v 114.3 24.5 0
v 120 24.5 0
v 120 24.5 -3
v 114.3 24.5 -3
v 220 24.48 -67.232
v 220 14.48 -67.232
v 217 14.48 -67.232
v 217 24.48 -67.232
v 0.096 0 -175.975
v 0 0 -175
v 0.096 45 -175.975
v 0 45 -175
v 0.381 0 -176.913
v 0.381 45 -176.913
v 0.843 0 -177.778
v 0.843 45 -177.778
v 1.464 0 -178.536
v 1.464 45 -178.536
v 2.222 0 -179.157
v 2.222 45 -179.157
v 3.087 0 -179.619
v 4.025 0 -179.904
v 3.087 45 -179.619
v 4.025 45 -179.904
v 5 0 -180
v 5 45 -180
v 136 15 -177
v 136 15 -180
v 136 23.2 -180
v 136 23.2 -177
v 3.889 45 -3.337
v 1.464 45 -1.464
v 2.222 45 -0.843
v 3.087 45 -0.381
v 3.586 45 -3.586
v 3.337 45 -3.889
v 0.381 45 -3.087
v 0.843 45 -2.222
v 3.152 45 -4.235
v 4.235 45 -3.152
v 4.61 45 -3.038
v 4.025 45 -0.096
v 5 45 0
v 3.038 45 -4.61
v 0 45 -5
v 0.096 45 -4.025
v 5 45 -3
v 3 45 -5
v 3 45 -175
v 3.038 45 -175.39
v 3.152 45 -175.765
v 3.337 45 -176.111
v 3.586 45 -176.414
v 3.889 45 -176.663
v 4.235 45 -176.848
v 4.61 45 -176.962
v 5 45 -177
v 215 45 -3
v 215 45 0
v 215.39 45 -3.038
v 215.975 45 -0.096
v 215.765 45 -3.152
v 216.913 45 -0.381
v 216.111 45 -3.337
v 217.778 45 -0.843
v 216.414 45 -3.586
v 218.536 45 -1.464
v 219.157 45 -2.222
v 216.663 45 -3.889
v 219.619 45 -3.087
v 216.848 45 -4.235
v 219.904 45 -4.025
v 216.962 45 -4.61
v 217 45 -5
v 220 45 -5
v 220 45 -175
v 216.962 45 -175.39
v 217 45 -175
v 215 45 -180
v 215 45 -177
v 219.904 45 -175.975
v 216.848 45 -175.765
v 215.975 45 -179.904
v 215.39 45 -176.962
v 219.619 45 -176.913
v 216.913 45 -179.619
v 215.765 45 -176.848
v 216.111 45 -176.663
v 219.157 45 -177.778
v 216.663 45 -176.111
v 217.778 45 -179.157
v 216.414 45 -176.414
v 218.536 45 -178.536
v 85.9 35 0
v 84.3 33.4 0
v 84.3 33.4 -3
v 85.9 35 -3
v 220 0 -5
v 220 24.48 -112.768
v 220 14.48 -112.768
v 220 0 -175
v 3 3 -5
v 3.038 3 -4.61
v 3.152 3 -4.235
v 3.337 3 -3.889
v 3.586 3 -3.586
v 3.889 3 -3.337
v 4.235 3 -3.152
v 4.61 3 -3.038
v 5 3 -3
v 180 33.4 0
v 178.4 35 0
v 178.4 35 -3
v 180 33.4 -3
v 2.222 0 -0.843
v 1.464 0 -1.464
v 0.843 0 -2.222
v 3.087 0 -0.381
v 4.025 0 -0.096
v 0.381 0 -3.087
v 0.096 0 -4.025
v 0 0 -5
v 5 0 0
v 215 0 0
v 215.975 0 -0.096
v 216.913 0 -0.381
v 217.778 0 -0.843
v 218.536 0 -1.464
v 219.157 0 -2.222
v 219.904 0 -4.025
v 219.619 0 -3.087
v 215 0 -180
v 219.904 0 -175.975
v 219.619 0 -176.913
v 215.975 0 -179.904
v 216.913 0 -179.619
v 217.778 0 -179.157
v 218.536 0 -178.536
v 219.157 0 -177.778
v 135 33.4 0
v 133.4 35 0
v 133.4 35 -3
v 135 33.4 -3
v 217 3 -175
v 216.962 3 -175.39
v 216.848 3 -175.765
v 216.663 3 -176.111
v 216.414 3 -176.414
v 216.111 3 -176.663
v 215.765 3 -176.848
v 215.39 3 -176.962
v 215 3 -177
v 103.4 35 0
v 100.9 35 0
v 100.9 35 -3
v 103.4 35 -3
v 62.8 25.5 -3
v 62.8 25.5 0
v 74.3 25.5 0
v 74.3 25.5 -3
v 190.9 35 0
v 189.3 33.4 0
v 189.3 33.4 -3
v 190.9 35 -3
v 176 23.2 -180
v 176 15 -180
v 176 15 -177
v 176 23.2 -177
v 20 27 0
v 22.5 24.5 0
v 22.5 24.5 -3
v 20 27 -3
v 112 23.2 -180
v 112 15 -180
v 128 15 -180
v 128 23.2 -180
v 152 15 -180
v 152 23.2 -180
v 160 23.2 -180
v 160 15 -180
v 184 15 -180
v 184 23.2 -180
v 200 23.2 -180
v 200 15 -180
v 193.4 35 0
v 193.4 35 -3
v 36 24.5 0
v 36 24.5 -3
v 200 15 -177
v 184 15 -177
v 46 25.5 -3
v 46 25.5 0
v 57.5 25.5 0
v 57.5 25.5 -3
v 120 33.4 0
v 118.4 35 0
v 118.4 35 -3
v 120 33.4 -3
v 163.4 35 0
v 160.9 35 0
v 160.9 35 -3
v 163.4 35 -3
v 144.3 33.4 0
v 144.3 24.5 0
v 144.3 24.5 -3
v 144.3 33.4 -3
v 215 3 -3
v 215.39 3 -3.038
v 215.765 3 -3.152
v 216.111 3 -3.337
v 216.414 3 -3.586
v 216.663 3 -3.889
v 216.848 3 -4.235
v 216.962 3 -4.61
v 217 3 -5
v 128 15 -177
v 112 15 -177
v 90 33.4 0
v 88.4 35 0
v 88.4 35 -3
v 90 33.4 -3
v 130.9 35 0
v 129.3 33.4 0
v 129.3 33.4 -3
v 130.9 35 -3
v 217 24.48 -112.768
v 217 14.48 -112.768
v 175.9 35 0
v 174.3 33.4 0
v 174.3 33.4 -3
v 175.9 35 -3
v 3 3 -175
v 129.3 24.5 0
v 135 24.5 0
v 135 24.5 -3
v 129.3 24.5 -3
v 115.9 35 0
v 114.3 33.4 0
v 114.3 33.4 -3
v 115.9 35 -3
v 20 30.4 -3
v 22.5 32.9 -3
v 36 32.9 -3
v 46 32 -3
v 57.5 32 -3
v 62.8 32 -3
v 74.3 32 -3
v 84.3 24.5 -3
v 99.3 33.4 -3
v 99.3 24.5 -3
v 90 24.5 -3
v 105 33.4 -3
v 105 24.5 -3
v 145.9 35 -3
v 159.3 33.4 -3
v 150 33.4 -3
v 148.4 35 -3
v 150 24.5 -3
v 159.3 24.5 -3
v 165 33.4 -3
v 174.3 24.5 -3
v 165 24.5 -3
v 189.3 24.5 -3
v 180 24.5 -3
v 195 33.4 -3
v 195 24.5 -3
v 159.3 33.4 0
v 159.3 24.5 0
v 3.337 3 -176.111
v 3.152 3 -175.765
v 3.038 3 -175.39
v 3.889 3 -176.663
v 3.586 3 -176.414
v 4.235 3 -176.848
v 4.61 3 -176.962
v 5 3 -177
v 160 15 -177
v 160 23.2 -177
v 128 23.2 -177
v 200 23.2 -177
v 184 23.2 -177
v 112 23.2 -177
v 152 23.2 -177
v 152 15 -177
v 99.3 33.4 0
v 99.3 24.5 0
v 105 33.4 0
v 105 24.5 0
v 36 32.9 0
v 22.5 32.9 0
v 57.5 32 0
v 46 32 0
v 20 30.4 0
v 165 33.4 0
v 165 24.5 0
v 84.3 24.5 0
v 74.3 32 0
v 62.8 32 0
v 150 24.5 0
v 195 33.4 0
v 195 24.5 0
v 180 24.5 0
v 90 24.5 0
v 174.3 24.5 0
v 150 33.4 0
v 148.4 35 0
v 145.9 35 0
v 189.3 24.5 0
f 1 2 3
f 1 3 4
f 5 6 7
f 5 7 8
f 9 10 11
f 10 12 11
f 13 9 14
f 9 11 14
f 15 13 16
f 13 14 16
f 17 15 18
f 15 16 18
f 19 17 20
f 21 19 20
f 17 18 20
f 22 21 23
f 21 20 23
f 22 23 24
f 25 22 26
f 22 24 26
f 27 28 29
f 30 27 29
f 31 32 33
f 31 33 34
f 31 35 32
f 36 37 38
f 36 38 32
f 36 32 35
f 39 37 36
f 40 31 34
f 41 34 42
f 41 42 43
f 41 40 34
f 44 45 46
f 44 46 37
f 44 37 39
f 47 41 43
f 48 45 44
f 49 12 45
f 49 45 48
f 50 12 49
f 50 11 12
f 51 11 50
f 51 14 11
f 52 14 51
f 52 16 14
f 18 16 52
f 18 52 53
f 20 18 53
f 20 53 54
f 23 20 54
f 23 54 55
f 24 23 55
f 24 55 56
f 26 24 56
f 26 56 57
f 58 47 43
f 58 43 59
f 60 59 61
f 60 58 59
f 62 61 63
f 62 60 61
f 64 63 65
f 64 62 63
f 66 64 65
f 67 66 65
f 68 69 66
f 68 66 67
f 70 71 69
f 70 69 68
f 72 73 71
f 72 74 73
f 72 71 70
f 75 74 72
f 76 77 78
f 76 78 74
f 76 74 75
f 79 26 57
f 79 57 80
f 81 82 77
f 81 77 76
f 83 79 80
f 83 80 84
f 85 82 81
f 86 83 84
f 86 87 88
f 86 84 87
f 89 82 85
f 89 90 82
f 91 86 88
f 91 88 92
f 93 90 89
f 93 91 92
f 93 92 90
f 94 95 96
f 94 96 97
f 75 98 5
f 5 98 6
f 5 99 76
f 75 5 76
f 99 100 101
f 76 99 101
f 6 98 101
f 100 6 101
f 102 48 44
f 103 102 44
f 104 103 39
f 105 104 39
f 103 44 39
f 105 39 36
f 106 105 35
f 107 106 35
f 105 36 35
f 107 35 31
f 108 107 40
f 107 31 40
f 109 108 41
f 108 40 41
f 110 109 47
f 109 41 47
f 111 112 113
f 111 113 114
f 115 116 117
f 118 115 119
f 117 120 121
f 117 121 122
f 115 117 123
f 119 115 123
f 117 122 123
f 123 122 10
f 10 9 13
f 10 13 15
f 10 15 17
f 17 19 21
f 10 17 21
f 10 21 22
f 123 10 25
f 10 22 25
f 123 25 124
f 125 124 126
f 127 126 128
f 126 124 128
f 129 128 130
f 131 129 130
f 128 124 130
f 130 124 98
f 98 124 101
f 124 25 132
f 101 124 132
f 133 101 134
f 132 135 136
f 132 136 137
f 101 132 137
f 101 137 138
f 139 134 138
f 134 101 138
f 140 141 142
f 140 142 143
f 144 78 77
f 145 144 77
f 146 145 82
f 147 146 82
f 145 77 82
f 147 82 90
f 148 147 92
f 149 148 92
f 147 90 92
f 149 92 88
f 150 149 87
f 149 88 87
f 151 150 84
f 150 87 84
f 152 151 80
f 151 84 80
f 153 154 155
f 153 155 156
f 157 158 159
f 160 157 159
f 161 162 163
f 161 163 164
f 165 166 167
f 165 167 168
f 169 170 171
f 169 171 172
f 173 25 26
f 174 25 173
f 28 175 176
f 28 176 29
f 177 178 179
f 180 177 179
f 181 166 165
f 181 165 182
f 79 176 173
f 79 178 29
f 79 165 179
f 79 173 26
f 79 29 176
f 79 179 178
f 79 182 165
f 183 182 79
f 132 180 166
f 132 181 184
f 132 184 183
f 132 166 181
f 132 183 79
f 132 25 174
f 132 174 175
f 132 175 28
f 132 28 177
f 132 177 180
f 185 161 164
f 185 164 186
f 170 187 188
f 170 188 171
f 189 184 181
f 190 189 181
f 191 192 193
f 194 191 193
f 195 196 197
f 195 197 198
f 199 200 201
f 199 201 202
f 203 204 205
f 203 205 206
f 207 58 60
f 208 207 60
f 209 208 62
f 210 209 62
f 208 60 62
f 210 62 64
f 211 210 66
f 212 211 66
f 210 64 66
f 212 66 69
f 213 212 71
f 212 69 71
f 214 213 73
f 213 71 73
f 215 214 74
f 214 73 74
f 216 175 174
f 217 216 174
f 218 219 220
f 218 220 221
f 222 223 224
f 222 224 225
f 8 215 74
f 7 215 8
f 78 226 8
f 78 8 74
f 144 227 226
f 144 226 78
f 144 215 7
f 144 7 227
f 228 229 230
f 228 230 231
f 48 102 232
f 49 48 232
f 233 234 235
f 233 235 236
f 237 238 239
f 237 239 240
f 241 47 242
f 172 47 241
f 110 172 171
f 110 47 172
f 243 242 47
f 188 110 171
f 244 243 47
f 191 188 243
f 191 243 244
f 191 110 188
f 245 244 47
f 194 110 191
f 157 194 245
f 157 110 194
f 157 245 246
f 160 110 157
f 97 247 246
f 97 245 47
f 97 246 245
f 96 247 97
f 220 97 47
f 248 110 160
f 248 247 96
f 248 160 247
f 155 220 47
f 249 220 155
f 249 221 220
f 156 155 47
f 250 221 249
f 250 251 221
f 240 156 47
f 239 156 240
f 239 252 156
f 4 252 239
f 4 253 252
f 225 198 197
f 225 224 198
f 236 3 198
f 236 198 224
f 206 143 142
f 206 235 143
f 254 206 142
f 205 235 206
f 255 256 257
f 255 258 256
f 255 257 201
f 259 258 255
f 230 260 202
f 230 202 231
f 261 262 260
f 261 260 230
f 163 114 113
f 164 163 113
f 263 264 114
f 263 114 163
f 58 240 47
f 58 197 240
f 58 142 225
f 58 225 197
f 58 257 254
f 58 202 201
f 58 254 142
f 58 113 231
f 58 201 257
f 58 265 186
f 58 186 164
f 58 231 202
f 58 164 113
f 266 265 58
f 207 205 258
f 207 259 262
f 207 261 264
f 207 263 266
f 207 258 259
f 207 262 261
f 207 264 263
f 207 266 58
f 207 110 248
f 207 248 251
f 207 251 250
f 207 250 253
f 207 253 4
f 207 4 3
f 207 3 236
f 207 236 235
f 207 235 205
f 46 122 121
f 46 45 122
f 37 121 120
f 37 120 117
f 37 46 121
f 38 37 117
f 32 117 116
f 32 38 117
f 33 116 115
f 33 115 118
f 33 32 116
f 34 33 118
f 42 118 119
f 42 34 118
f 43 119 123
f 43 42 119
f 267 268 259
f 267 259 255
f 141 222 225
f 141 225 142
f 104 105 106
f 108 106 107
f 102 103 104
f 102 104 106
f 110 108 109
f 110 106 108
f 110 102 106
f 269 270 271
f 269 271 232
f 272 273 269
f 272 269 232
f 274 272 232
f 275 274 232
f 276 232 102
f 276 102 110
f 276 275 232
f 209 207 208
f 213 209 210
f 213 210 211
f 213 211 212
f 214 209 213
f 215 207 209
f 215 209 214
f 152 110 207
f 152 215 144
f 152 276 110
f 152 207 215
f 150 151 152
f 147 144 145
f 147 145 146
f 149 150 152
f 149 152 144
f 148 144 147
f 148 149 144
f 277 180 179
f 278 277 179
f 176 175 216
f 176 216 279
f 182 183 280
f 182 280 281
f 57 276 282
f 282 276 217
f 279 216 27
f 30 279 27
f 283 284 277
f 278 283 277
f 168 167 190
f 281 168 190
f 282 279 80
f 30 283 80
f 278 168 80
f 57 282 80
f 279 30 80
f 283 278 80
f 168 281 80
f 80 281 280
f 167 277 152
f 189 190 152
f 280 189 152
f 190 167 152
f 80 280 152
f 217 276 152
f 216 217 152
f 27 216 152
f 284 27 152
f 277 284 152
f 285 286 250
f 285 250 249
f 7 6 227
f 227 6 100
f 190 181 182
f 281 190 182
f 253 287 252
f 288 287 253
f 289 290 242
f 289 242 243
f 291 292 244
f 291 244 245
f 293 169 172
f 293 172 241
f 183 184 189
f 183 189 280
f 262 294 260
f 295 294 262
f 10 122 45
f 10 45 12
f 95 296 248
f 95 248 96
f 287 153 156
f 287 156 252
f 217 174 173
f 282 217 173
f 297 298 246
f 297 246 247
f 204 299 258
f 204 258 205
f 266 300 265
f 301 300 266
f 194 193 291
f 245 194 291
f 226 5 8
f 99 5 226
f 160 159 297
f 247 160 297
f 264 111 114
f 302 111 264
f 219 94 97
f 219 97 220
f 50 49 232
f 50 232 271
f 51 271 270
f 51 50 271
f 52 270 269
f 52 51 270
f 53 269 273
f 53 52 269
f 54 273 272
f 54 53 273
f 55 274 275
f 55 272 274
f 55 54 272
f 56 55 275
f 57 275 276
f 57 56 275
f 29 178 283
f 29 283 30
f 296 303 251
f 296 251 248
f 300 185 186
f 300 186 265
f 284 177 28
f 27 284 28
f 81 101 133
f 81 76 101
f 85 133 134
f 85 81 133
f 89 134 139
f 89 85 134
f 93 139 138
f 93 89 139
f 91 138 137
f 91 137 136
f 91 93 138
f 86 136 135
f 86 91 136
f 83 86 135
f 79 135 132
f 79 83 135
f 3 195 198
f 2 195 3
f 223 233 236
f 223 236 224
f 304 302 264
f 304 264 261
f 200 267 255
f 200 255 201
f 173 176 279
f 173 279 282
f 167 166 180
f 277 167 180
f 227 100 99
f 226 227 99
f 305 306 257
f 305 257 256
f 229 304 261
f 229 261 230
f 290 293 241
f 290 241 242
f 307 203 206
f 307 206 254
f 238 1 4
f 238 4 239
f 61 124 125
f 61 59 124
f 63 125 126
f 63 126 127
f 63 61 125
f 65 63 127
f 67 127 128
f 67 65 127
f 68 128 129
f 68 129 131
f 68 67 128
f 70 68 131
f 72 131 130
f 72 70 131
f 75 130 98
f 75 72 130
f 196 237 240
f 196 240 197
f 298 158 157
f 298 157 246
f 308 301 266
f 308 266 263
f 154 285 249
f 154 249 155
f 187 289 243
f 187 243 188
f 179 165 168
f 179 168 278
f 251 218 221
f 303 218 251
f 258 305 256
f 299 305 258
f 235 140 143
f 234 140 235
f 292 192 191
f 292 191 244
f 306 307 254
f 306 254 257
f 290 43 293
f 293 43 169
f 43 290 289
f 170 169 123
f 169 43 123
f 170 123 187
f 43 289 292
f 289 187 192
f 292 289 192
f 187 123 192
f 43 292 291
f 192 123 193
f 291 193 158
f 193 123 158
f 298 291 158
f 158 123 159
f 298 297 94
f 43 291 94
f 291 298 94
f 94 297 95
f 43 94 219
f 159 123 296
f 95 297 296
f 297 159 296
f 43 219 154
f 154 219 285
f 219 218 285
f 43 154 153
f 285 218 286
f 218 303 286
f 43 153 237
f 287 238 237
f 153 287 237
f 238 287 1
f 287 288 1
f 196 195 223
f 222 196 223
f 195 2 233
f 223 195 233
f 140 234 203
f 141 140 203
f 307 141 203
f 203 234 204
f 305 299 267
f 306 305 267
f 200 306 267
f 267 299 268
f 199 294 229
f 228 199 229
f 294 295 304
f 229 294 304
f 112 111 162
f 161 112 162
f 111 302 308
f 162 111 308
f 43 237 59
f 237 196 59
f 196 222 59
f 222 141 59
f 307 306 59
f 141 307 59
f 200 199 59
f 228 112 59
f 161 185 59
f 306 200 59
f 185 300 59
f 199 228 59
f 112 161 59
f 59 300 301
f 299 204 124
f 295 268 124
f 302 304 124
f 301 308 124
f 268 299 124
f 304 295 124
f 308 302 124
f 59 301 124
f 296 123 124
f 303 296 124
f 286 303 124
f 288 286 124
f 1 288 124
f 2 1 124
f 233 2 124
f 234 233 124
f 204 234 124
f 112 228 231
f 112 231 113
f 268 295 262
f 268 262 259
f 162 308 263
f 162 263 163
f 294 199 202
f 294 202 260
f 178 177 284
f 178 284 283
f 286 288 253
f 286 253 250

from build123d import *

# Parameters (mm, degrees)
SKETCH1_W           = 220
SKETCH1_H           = 180
BOSS_EXTRUDE1_DEPTH = 45
FILLET1_R           = 5
SHELL1_T            = -3
CUT_EXTRUDE2_DEPTH  = 5
CUT_EXTRUDE3_DEPTH  = 5
SKETCH4_W           = 11.5
SKETCH4_H           = 6.5
CUT_EXTRUDE4_DEPTH  = 5
SKETCH5_W           = 45.536818034
SKETCH5_H           = 10
CUT_EXTRUDE5_DEPTH  = 5
SKETCH6_W           = 16
SKETCH6_H           = 8.2
CUT_EXTRUDE6_DEPTH  = 5


with BuildPart() as part:
    # Sketch1 → Boss-Extrude1 (new body)
    with BuildSketch(Plane(origin=(0, 0, 0), x_dir=(1, 0, 0), z_dir=(0, 1, 0))):
        with Locations((110, 90)):
            Rectangle(SKETCH1_W, SKETCH1_H)
    extrude(amount=BOSS_EXTRUDE1_DEPTH)

    # Fillet1
    fillet1_edges = [part.edges().sort_by_distance(p)[0] for p in [
        (0, 22.5, -180),
        (220, 22.5, -180),
        (220, 22.5, 0),
        (0, 22.5, 0),
    ]]
    fillet(fillet1_edges, radius=FILLET1_R)

    # Shell1
    shell1_openings = [part.faces().sort_by_distance(p)[0] for p in [
        (110, 45, -90),
    ]]
    offset(amount=SHELL1_T, openings=shell1_openings, kind=Kind.INTERSECTION)

    # Sketch2 → Cut-Extrude2 (cut)
    with BuildSketch(Plane.XY):
        Polygon((175.9, 35), (178.4, 35), (180, 33.4), (180, 24.5), (174.3, 24.5), (174.3, 33.4), align=None)
        Polygon((190.9, 35), (193.4, 35), (195, 33.4), (195, 24.5), (189.3, 24.5), (189.3, 33.4), align=None)
        Polygon((160.9, 35), (163.4, 35), (165, 33.4), (165, 24.5), (159.3, 24.5), (159.3, 33.4), align=None)
        Polygon((145.9, 35), (148.4, 35), (150, 33.4), (150, 24.5), (144.3, 24.5), (144.3, 33.4), align=None)
        Polygon((130.9, 35), (133.4, 35), (135, 33.4), (135, 24.5), (129.3, 24.5), (129.3, 33.4), align=None)
        Polygon((115.9, 35), (118.4, 35), (120, 33.4), (120, 24.5), (114.3, 24.5), (114.3, 33.4), align=None)
        Polygon((100.9, 35), (103.4, 35), (105, 33.4), (105, 24.5), (99.3, 24.5), (99.3, 33.4), align=None)
        Polygon((85.9, 35), (88.4, 35), (90, 33.4), (90, 24.5), (84.3, 24.5), (84.3, 33.4), align=None)
    extrude(amount=-CUT_EXTRUDE2_DEPTH, mode=Mode.SUBTRACT)

    # Sketch3 → Cut-Extrude3 (cut)
    with BuildSketch(Plane.XY):
        Polygon((22.5, 32.9), (36, 32.9), (36, 24.5), (22.5, 24.5), (20, 27), (20, 30.4), align=None)
    extrude(amount=-CUT_EXTRUDE3_DEPTH, mode=Mode.SUBTRACT)

    # Sketch4 → Cut-Extrude4 (cut)
    with BuildSketch(Plane.XY):
        with Locations((51.75, 28.75)):
            Rectangle(SKETCH4_W, SKETCH4_H)
        with Locations((68.55, 28.75)):
            Rectangle(SKETCH4_W, SKETCH4_H)
    extrude(amount=-CUT_EXTRUDE4_DEPTH, mode=Mode.SUBTRACT)

    # Sketch5 → Cut-Extrude5 (cut)
    with BuildSketch(Plane(origin=(220, 0, 0), x_dir=(0, 0, -1), z_dir=(1, 0, 0))):
        with Locations((90, 19.480228536)):
            Rectangle(SKETCH5_W, SKETCH5_H)
    extrude(amount=-CUT_EXTRUDE5_DEPTH, mode=Mode.SUBTRACT)

    # Sketch6 → Cut-Extrude6 (cut)
    with BuildSketch(Plane(origin=(0, 0, -180), x_dir=(-1, 0, 0), z_dir=(0, 0, -1))):
        with Locations((-192, 19.1)):
            Rectangle(SKETCH6_W, SKETCH6_H)
        with Locations((-168, 19.1)):
            Rectangle(SKETCH6_W, SKETCH6_H)
        with Locations((-144, 19.1)):
            Rectangle(SKETCH6_W, SKETCH6_H)
        with Locations((-120, 19.1)):
            Rectangle(SKETCH6_W, SKETCH6_H)
    extrude(amount=-CUT_EXTRUDE6_DEPTH, mode=Mode.SUBTRACT)


solid = part.part
